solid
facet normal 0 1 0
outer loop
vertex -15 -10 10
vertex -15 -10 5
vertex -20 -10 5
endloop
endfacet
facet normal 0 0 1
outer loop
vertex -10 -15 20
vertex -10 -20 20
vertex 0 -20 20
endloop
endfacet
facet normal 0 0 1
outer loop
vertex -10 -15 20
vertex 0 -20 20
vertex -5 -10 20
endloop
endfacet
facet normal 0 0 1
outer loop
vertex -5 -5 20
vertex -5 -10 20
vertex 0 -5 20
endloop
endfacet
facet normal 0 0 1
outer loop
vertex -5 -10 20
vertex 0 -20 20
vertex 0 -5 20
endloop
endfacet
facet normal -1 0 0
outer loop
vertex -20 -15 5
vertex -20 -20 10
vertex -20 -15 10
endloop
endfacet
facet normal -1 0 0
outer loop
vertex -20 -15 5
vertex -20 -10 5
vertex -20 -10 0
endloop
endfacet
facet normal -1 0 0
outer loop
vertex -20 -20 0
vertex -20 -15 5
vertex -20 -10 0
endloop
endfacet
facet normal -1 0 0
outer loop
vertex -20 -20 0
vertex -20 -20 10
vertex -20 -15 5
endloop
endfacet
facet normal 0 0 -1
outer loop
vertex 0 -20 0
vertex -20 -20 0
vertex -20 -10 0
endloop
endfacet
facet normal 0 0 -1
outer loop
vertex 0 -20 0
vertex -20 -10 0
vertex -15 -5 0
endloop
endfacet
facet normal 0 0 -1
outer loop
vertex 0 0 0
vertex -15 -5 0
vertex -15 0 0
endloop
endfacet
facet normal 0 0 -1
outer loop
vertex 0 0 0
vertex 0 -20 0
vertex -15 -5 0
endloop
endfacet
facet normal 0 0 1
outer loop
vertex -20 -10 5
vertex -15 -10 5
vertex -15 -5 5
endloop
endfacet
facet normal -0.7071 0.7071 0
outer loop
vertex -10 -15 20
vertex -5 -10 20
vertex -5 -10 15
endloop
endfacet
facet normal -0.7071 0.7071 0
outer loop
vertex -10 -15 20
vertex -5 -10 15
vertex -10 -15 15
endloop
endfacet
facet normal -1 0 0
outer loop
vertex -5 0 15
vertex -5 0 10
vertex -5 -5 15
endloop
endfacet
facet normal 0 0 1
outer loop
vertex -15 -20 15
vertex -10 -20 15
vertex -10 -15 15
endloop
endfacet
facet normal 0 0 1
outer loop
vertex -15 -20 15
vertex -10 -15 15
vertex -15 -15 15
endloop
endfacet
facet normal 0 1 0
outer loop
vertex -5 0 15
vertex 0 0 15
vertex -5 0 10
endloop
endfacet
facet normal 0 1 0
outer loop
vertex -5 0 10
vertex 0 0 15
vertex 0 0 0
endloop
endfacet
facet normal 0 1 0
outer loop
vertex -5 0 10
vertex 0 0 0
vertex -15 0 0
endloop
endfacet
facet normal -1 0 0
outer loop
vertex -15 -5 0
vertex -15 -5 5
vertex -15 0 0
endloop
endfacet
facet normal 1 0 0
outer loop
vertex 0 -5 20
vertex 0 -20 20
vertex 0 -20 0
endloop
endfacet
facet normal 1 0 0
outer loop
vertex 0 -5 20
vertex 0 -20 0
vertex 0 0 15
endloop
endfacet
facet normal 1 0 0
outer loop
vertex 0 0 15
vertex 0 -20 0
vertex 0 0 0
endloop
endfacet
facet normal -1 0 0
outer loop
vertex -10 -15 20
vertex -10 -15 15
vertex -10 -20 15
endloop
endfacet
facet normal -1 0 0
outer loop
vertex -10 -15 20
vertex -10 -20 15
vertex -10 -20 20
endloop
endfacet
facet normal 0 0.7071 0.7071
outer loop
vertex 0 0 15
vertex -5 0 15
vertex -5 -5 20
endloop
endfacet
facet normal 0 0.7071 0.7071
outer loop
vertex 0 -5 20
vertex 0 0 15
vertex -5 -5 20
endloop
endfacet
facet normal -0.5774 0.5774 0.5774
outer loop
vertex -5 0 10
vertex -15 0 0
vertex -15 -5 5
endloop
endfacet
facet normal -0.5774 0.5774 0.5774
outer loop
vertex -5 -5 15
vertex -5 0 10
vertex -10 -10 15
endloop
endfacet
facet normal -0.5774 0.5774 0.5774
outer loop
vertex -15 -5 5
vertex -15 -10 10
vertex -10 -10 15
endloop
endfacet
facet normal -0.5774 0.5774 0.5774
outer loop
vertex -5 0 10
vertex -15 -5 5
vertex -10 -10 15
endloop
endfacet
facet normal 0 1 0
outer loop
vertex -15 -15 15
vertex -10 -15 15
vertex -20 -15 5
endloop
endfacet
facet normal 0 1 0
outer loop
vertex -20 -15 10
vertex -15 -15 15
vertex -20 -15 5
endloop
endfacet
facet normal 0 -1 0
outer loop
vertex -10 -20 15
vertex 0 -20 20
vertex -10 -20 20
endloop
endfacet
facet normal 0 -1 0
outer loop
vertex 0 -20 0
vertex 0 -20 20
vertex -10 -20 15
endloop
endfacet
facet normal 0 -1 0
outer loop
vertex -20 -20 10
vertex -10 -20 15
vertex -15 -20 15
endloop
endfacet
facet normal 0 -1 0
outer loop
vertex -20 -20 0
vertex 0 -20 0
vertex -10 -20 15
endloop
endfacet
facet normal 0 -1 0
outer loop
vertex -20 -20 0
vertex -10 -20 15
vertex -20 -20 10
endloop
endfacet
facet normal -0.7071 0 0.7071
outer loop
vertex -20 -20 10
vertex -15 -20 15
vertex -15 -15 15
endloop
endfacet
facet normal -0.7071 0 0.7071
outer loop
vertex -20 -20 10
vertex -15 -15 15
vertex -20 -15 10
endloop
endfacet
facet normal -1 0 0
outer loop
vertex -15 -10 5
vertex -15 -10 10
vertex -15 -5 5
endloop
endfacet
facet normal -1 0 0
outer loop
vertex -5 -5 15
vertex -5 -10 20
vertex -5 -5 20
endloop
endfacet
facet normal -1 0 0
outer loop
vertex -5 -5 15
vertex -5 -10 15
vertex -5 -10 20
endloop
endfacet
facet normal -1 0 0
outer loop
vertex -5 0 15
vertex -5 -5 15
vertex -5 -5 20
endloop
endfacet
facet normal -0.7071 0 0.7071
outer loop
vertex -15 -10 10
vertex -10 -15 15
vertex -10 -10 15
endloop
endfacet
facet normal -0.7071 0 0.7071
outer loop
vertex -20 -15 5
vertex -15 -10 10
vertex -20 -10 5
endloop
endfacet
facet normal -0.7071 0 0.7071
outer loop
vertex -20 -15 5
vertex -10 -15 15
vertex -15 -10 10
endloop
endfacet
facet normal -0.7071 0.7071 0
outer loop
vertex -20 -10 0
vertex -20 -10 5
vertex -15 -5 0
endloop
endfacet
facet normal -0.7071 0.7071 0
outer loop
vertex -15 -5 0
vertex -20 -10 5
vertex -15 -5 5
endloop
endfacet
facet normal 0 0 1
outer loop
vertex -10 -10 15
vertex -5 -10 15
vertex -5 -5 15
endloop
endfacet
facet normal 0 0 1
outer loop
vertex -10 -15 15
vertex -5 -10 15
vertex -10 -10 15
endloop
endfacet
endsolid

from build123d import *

# Parameters (mm, degrees)
BOSS_EXTRUDE1_DEPTH  = 20
SKETCH2_W            = 5
SKETCH2_H            = 20
BOSS_EXTRUDE2_DEPTH  = 5
CUT_EXTRUDE1_DEPTH   = 5
SKETCH4_W            = 5
SKETCH4_H            = 10
BOSS_EXTRUDE3_DEPTH  = 5
CUT_EXTRUDE2_DEPTH   = 5
BOSS_EXTRUDE31_DEPTH = 20
CUT_EXTRUDE11_DEPTH  = 25
SKETCH24_W           = 5
SKETCH24_H           = 15
BOSS_EXTRUDE32_DEPTH = 5
CUT_EXTRUDE12_DEPTH  = 5
BOSS_EXTRUDE33_DEPTH = 5
BOSS_EXTRUDE34_DEPTH = 5


with BuildPart() as part:
    # Sketch1 → Boss-Extrude1 (new body)
    with BuildSketch(Plane(origin=(0, 0, 0), x_dir=(1, 0, 0), z_dir=(0, 1, 0))):
        Polygon((-15, 0), (0, 0), (0, -15), (-5, -15), (-5, -10), align=None)
    extrude(amount=-BOSS_EXTRUDE1_DEPTH)

    # Sketch2 → Boss-Extrude2 (add)
    with BuildSketch(Plane.XY.offset(15)):
        with Locations((-2.5, -10)):
            Rectangle(SKETCH2_W, SKETCH2_H)
    extrude(amount=BOSS_EXTRUDE2_DEPTH)

    # Sketch3 → Cut-Extrude1 (cut)
    with BuildSketch(Plane.ZY.offset(5)):
        Polygon((15, 0), (20, -5), (20, 0), align=None)
    extrude(amount=-CUT_EXTRUDE1_DEPTH, mode=Mode.SUBTRACT)

    # Sketch4 → Boss-Extrude3 (add)
    with BuildSketch(Plane.ZY.offset(5)):
        with Locations((17.5, -15)):
            Rectangle(SKETCH4_W, SKETCH4_H)
    extrude(amount=BOSS_EXTRUDE3_DEPTH)

    # Sketch5 → Cut-Extrude2 (cut)
    with BuildSketch(Plane.XY.offset(20)):
        Polygon((-5, -10), (-10, -15), (-10, -10), align=None)
    extrude(amount=-CUT_EXTRUDE2_DEPTH, mode=Mode.SUBTRACT)

    # Sketch14 → Boss-Extrude31 (add)
    with BuildSketch(Plane(origin=(0, -20, 0), x_dir=(-1, 0, 0), z_dir=(0, -1, 0))):
        Polygon((15, 0), (5, -10), (5, -15), (10, -15), (15, -10), align=None)
    extrude(amount=-BOSS_EXTRUDE31_DEPTH)

    # 3DSketch7 → Cut-Extrude11 (cut, along a direction that is not the sketch's normal)
    with BuildSketch(Plane(origin=(-15, 0, 0), x_dir=(0.5345224838248488, -0.2672612419124244, 0.8017837257372732), z_dir=(0.5773502691896258, -0.5773502691896258, -0.5773502691896258))):
        Polygon((0, 0), (13.363062096, -4.629100499), (18.708286934, 0), (17.371980724, 6.943650748), (10.690449676, 9.258200998), align=None)
    extrude(amount=-CUT_EXTRUDE11_DEPTH, dir=(0, 0, -1), mode=Mode.SUBTRACT)

    # Sketch24 → Boss-Extrude32 (add)
    with BuildSketch(Plane.ZY.offset(15)):
        with Locations((2.5, -12.5)):
            Rectangle(SKETCH24_W, SKETCH24_H)
    extrude(amount=BOSS_EXTRUDE32_DEPTH)

    # Sketch25 → Cut-Extrude12 (cut)
    with BuildSketch(Plane.XY.offset(5)):
        Polygon((-15, -5), (-20, -5), (-20, -10), align=None)
    extrude(amount=-CUT_EXTRUDE12_DEPTH, mode=Mode.SUBTRACT)

    # Sketch26 → Boss-Extrude33 (add)
    with BuildSketch(Plane(origin=(0, -20, 0), x_dir=(-1, 0, 0), z_dir=(0, -1, 0))):
        Polygon((20, -5), (15, -5), (15, -10), (10, -15), (15, -15), (20, -10), align=None)
    extrude(amount=-BOSS_EXTRUDE33_DEPTH)

    # Sketch27 → Boss-Extrude34 (add)
    with BuildSketch(Plane(origin=(0, -15, 0), x_dir=(1, 0, 0), z_dir=(0, 1, 0))):
        Polygon((-20, -5), (-15, -5), (-15, -10), align=None)
    extrude(amount=BOSS_EXTRUDE34_DEPTH)


solid = part.part
